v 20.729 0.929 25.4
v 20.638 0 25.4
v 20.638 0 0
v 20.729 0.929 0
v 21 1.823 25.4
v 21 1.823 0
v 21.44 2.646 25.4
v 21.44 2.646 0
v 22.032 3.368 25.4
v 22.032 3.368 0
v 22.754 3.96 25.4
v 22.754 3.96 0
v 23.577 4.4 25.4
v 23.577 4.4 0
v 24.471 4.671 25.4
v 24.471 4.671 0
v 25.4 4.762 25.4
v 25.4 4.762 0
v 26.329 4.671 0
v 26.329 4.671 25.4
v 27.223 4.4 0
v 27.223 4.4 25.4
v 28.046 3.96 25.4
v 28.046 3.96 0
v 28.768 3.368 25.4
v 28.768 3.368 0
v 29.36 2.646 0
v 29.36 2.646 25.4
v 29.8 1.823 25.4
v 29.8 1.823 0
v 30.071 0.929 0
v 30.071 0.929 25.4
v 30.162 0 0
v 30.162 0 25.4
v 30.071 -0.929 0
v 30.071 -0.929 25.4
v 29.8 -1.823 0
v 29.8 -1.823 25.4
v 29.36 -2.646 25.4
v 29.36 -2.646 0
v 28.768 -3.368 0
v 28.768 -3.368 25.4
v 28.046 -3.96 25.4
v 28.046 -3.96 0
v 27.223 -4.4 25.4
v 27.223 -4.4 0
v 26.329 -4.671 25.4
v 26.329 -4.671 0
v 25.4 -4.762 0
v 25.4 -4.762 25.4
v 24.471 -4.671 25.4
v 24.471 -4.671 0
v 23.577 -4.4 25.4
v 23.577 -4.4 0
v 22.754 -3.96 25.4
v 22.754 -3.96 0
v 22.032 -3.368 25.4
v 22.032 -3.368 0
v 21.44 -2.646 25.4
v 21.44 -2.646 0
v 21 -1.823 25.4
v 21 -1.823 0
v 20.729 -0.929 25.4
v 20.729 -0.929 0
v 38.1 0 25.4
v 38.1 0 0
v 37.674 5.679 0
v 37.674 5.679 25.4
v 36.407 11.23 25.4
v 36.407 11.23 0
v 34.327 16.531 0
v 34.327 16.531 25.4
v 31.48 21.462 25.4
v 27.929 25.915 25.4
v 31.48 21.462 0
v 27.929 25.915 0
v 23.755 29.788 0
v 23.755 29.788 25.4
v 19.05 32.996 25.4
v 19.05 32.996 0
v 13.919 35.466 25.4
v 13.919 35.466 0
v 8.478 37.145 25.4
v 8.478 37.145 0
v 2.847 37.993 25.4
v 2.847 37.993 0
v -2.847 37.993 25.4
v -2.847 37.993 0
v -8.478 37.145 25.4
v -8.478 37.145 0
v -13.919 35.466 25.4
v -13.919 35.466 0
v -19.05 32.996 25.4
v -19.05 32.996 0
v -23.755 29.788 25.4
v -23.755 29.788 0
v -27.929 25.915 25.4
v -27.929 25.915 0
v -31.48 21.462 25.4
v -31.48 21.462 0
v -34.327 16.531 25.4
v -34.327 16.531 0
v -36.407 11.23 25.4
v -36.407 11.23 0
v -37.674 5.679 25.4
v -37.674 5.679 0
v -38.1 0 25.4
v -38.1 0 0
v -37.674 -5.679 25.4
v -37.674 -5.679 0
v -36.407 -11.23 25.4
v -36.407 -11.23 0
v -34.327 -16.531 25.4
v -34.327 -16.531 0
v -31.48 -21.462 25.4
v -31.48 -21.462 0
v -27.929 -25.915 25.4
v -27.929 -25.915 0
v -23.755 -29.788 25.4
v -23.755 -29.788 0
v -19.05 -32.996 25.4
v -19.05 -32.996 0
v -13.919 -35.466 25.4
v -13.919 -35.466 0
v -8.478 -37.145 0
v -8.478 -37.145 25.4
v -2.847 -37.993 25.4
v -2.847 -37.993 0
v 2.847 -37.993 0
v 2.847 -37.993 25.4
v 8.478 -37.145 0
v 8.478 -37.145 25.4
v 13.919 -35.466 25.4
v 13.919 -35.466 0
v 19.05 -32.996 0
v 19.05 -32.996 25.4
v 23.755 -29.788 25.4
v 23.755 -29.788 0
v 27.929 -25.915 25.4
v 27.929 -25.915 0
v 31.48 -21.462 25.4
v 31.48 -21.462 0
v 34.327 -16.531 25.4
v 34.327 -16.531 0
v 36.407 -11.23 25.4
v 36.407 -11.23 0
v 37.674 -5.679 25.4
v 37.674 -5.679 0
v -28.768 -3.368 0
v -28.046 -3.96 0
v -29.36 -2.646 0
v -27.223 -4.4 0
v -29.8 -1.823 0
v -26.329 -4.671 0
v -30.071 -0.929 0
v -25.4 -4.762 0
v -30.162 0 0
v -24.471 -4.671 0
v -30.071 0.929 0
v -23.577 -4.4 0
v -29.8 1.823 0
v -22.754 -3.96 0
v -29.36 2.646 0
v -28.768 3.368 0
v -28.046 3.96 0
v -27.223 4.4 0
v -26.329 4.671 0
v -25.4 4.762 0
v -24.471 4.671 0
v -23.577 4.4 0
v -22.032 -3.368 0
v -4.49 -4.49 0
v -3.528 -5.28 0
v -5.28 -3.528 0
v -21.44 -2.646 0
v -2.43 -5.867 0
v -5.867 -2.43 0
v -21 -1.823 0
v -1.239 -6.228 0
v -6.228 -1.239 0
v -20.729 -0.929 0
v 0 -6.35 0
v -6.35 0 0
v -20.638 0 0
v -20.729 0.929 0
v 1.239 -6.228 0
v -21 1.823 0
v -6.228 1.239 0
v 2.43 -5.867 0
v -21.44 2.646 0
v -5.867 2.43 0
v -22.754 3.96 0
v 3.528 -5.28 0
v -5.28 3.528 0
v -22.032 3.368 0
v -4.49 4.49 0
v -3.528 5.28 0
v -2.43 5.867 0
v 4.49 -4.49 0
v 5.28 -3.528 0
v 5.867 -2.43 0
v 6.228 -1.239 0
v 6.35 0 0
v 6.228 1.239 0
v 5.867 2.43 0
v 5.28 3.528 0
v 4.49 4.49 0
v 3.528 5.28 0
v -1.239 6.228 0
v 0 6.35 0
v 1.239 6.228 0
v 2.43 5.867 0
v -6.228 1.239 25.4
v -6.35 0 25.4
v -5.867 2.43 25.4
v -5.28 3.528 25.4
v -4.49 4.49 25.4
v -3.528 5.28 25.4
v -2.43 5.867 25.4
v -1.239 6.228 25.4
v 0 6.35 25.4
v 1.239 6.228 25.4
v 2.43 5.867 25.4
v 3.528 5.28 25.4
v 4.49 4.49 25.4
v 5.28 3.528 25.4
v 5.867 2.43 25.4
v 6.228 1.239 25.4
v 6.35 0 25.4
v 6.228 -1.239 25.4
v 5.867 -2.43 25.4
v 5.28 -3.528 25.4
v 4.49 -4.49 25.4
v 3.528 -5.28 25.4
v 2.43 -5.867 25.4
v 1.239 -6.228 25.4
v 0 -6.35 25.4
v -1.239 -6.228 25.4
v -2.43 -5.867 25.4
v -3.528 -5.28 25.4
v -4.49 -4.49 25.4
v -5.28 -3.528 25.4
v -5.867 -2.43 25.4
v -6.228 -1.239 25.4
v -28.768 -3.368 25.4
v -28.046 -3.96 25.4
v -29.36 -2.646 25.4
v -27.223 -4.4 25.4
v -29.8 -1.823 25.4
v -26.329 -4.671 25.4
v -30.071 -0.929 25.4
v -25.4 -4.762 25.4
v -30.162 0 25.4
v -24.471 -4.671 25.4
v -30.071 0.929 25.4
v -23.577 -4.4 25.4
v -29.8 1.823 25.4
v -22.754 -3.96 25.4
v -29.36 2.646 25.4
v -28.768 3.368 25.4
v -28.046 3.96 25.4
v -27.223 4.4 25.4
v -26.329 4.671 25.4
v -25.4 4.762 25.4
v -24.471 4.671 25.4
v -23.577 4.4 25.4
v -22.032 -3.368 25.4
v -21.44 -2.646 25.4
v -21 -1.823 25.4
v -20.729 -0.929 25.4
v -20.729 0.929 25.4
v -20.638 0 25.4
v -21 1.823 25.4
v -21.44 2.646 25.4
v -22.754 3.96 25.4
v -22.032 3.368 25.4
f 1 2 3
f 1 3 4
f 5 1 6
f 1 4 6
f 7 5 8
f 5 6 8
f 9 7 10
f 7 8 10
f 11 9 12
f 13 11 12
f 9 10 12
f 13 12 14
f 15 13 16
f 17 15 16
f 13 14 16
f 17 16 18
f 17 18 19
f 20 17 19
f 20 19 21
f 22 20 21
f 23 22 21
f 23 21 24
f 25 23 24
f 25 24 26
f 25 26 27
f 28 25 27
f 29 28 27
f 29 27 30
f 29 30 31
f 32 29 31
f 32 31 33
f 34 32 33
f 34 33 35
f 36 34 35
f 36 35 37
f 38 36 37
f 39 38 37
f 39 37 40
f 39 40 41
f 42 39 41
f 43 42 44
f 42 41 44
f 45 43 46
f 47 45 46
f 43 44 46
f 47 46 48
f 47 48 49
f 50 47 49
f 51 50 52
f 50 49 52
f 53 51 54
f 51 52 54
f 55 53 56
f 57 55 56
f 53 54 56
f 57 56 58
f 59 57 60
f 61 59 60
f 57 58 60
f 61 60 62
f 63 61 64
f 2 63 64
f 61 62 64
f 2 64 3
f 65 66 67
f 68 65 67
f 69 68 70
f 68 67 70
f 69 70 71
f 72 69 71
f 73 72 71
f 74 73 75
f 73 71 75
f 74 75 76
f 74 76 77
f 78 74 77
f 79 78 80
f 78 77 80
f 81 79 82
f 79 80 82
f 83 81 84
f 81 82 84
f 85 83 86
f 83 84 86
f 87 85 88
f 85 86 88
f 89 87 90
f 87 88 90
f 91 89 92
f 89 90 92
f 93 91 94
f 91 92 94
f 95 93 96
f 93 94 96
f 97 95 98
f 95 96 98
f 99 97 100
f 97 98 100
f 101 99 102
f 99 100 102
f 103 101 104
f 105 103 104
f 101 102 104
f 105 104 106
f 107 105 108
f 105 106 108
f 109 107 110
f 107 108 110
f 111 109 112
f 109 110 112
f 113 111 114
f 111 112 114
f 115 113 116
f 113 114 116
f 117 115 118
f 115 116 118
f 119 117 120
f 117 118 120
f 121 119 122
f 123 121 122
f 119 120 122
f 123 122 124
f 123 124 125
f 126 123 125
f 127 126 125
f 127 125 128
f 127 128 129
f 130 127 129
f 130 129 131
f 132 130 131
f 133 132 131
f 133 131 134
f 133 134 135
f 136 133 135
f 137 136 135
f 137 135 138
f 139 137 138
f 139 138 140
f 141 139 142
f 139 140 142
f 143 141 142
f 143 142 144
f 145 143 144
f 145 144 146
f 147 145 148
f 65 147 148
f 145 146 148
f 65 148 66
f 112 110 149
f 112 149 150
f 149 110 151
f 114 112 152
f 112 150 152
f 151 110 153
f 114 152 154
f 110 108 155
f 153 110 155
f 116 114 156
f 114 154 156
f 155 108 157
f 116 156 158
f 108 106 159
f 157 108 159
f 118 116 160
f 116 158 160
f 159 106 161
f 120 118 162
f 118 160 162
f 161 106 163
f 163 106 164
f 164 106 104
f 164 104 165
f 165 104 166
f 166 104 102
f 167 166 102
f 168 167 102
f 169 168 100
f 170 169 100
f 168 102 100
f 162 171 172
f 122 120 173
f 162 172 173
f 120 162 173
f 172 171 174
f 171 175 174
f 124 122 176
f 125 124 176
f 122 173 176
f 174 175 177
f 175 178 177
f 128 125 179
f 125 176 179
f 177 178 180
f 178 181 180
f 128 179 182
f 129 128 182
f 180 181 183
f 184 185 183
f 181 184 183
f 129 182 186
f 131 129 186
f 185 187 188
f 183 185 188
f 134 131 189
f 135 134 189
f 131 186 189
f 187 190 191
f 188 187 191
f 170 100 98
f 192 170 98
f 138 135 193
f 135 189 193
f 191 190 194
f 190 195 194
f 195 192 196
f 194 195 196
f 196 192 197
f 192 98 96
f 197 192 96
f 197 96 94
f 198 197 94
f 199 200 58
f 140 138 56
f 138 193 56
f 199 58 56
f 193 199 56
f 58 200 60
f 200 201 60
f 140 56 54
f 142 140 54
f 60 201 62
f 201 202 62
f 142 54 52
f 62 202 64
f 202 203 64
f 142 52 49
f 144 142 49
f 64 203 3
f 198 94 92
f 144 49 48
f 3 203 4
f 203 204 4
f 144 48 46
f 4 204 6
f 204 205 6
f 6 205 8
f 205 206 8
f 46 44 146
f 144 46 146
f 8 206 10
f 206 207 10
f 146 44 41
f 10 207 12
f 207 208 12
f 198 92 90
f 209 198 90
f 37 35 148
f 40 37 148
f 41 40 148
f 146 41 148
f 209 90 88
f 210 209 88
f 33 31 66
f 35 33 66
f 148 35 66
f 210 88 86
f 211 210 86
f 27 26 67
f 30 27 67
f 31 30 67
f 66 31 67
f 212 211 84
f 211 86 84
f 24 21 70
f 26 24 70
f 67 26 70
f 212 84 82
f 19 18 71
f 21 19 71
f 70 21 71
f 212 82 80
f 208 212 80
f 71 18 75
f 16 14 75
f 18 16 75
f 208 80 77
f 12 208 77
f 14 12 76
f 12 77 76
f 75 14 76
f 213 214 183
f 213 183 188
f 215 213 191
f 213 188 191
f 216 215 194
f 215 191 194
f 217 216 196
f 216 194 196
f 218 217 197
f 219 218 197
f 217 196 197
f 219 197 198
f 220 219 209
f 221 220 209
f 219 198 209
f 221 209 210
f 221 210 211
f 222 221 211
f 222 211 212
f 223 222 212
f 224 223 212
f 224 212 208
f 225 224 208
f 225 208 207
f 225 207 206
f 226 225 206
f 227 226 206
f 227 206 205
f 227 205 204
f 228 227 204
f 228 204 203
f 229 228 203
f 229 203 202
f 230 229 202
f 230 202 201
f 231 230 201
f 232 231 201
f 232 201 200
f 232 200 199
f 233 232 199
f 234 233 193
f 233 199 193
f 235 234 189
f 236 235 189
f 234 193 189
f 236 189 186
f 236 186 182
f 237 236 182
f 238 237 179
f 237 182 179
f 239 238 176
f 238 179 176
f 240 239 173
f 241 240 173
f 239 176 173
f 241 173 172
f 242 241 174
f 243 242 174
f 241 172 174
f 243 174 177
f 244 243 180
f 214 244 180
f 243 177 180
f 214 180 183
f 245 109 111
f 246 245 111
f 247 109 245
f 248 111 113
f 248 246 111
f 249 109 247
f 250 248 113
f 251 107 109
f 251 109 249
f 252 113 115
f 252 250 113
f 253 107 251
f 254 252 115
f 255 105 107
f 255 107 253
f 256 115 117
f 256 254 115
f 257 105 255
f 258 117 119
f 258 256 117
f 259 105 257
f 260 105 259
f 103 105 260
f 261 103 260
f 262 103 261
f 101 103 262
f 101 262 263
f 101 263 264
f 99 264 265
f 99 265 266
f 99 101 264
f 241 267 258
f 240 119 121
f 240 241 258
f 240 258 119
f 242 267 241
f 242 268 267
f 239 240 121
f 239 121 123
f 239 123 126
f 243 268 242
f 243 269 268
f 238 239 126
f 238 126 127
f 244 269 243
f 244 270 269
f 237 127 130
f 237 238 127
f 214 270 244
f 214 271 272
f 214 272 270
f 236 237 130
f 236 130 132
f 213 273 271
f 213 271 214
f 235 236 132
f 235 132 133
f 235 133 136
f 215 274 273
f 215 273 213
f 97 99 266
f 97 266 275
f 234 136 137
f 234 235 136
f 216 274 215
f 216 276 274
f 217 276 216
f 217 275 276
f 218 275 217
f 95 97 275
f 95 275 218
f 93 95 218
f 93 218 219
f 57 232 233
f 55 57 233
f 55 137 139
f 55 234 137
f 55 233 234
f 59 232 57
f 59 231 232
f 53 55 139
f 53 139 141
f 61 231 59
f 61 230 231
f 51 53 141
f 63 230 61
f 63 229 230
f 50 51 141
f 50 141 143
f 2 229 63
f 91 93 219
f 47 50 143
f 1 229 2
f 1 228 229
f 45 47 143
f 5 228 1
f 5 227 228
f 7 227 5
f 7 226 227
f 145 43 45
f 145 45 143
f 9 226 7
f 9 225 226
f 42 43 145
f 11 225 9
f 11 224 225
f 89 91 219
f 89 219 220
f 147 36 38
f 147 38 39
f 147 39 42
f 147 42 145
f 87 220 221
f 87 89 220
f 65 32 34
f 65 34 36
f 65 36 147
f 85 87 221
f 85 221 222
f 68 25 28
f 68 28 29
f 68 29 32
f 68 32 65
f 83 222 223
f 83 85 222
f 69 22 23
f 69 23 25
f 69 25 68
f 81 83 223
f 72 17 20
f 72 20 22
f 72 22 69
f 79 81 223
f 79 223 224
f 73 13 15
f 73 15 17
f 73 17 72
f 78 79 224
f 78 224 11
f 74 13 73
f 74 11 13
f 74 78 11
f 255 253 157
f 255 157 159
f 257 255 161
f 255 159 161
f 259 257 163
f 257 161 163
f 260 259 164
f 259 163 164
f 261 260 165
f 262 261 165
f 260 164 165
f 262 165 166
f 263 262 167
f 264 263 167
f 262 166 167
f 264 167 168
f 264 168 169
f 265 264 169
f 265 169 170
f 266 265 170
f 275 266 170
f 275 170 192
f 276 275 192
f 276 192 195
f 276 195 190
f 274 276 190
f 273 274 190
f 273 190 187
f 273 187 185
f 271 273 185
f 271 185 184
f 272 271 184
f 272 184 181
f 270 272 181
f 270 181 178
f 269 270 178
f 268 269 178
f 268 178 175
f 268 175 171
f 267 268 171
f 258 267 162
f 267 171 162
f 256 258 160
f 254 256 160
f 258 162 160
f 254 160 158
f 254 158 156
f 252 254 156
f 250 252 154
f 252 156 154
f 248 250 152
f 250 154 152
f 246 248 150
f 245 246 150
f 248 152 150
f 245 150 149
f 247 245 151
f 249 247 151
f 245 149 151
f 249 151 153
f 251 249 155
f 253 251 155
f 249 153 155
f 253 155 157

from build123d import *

# Parameters (mm, degrees)
SKETCH1_R                   = 38.1
OD_DON_T_CARE_DEPTH         = 25.4
SKETCH2_R                   = 4.7625
F_3_8_16_TAPPED_HOLES_DEPTH = 60.56828015
SKETCH4_R                   = 6.35
F_1_2_13_TAPPED_HOLE_DEPTH  = 60.56828015


with BuildPart() as part:
    # Sketch1 → OD Don't Care (new body)
    with BuildSketch(Plane.XY):
        Circle(SKETCH1_R)
    extrude(amount=OD_DON_T_CARE_DEPTH)

    # Sketch2 → 3/8"-16 Tapped Holes (cut, through all)
    with BuildSketch(Plane(origin=(0, 0, 0), x_dir=(-1, 0, 0), z_dir=(0, 0, -1))):
        with Locations((-25.4, 0)):
            Circle(SKETCH2_R)
        with Locations((25.4, 0)):
            Circle(SKETCH2_R)
    extrude(amount=-F_3_8_16_TAPPED_HOLES_DEPTH, mode=Mode.SUBTRACT)

    # Sketch4 → 1/2"-13 Tapped Hole (cut, through all)
    with BuildSketch(Plane(origin=(0, 0, 0), x_dir=(-1, 0, 0), z_dir=(0, 0, -1))):
        Circle(SKETCH4_R)
    extrude(amount=-F_1_2_13_TAPPED_HOLE_DEPTH, mode=Mode.SUBTRACT)


solid = part.part
